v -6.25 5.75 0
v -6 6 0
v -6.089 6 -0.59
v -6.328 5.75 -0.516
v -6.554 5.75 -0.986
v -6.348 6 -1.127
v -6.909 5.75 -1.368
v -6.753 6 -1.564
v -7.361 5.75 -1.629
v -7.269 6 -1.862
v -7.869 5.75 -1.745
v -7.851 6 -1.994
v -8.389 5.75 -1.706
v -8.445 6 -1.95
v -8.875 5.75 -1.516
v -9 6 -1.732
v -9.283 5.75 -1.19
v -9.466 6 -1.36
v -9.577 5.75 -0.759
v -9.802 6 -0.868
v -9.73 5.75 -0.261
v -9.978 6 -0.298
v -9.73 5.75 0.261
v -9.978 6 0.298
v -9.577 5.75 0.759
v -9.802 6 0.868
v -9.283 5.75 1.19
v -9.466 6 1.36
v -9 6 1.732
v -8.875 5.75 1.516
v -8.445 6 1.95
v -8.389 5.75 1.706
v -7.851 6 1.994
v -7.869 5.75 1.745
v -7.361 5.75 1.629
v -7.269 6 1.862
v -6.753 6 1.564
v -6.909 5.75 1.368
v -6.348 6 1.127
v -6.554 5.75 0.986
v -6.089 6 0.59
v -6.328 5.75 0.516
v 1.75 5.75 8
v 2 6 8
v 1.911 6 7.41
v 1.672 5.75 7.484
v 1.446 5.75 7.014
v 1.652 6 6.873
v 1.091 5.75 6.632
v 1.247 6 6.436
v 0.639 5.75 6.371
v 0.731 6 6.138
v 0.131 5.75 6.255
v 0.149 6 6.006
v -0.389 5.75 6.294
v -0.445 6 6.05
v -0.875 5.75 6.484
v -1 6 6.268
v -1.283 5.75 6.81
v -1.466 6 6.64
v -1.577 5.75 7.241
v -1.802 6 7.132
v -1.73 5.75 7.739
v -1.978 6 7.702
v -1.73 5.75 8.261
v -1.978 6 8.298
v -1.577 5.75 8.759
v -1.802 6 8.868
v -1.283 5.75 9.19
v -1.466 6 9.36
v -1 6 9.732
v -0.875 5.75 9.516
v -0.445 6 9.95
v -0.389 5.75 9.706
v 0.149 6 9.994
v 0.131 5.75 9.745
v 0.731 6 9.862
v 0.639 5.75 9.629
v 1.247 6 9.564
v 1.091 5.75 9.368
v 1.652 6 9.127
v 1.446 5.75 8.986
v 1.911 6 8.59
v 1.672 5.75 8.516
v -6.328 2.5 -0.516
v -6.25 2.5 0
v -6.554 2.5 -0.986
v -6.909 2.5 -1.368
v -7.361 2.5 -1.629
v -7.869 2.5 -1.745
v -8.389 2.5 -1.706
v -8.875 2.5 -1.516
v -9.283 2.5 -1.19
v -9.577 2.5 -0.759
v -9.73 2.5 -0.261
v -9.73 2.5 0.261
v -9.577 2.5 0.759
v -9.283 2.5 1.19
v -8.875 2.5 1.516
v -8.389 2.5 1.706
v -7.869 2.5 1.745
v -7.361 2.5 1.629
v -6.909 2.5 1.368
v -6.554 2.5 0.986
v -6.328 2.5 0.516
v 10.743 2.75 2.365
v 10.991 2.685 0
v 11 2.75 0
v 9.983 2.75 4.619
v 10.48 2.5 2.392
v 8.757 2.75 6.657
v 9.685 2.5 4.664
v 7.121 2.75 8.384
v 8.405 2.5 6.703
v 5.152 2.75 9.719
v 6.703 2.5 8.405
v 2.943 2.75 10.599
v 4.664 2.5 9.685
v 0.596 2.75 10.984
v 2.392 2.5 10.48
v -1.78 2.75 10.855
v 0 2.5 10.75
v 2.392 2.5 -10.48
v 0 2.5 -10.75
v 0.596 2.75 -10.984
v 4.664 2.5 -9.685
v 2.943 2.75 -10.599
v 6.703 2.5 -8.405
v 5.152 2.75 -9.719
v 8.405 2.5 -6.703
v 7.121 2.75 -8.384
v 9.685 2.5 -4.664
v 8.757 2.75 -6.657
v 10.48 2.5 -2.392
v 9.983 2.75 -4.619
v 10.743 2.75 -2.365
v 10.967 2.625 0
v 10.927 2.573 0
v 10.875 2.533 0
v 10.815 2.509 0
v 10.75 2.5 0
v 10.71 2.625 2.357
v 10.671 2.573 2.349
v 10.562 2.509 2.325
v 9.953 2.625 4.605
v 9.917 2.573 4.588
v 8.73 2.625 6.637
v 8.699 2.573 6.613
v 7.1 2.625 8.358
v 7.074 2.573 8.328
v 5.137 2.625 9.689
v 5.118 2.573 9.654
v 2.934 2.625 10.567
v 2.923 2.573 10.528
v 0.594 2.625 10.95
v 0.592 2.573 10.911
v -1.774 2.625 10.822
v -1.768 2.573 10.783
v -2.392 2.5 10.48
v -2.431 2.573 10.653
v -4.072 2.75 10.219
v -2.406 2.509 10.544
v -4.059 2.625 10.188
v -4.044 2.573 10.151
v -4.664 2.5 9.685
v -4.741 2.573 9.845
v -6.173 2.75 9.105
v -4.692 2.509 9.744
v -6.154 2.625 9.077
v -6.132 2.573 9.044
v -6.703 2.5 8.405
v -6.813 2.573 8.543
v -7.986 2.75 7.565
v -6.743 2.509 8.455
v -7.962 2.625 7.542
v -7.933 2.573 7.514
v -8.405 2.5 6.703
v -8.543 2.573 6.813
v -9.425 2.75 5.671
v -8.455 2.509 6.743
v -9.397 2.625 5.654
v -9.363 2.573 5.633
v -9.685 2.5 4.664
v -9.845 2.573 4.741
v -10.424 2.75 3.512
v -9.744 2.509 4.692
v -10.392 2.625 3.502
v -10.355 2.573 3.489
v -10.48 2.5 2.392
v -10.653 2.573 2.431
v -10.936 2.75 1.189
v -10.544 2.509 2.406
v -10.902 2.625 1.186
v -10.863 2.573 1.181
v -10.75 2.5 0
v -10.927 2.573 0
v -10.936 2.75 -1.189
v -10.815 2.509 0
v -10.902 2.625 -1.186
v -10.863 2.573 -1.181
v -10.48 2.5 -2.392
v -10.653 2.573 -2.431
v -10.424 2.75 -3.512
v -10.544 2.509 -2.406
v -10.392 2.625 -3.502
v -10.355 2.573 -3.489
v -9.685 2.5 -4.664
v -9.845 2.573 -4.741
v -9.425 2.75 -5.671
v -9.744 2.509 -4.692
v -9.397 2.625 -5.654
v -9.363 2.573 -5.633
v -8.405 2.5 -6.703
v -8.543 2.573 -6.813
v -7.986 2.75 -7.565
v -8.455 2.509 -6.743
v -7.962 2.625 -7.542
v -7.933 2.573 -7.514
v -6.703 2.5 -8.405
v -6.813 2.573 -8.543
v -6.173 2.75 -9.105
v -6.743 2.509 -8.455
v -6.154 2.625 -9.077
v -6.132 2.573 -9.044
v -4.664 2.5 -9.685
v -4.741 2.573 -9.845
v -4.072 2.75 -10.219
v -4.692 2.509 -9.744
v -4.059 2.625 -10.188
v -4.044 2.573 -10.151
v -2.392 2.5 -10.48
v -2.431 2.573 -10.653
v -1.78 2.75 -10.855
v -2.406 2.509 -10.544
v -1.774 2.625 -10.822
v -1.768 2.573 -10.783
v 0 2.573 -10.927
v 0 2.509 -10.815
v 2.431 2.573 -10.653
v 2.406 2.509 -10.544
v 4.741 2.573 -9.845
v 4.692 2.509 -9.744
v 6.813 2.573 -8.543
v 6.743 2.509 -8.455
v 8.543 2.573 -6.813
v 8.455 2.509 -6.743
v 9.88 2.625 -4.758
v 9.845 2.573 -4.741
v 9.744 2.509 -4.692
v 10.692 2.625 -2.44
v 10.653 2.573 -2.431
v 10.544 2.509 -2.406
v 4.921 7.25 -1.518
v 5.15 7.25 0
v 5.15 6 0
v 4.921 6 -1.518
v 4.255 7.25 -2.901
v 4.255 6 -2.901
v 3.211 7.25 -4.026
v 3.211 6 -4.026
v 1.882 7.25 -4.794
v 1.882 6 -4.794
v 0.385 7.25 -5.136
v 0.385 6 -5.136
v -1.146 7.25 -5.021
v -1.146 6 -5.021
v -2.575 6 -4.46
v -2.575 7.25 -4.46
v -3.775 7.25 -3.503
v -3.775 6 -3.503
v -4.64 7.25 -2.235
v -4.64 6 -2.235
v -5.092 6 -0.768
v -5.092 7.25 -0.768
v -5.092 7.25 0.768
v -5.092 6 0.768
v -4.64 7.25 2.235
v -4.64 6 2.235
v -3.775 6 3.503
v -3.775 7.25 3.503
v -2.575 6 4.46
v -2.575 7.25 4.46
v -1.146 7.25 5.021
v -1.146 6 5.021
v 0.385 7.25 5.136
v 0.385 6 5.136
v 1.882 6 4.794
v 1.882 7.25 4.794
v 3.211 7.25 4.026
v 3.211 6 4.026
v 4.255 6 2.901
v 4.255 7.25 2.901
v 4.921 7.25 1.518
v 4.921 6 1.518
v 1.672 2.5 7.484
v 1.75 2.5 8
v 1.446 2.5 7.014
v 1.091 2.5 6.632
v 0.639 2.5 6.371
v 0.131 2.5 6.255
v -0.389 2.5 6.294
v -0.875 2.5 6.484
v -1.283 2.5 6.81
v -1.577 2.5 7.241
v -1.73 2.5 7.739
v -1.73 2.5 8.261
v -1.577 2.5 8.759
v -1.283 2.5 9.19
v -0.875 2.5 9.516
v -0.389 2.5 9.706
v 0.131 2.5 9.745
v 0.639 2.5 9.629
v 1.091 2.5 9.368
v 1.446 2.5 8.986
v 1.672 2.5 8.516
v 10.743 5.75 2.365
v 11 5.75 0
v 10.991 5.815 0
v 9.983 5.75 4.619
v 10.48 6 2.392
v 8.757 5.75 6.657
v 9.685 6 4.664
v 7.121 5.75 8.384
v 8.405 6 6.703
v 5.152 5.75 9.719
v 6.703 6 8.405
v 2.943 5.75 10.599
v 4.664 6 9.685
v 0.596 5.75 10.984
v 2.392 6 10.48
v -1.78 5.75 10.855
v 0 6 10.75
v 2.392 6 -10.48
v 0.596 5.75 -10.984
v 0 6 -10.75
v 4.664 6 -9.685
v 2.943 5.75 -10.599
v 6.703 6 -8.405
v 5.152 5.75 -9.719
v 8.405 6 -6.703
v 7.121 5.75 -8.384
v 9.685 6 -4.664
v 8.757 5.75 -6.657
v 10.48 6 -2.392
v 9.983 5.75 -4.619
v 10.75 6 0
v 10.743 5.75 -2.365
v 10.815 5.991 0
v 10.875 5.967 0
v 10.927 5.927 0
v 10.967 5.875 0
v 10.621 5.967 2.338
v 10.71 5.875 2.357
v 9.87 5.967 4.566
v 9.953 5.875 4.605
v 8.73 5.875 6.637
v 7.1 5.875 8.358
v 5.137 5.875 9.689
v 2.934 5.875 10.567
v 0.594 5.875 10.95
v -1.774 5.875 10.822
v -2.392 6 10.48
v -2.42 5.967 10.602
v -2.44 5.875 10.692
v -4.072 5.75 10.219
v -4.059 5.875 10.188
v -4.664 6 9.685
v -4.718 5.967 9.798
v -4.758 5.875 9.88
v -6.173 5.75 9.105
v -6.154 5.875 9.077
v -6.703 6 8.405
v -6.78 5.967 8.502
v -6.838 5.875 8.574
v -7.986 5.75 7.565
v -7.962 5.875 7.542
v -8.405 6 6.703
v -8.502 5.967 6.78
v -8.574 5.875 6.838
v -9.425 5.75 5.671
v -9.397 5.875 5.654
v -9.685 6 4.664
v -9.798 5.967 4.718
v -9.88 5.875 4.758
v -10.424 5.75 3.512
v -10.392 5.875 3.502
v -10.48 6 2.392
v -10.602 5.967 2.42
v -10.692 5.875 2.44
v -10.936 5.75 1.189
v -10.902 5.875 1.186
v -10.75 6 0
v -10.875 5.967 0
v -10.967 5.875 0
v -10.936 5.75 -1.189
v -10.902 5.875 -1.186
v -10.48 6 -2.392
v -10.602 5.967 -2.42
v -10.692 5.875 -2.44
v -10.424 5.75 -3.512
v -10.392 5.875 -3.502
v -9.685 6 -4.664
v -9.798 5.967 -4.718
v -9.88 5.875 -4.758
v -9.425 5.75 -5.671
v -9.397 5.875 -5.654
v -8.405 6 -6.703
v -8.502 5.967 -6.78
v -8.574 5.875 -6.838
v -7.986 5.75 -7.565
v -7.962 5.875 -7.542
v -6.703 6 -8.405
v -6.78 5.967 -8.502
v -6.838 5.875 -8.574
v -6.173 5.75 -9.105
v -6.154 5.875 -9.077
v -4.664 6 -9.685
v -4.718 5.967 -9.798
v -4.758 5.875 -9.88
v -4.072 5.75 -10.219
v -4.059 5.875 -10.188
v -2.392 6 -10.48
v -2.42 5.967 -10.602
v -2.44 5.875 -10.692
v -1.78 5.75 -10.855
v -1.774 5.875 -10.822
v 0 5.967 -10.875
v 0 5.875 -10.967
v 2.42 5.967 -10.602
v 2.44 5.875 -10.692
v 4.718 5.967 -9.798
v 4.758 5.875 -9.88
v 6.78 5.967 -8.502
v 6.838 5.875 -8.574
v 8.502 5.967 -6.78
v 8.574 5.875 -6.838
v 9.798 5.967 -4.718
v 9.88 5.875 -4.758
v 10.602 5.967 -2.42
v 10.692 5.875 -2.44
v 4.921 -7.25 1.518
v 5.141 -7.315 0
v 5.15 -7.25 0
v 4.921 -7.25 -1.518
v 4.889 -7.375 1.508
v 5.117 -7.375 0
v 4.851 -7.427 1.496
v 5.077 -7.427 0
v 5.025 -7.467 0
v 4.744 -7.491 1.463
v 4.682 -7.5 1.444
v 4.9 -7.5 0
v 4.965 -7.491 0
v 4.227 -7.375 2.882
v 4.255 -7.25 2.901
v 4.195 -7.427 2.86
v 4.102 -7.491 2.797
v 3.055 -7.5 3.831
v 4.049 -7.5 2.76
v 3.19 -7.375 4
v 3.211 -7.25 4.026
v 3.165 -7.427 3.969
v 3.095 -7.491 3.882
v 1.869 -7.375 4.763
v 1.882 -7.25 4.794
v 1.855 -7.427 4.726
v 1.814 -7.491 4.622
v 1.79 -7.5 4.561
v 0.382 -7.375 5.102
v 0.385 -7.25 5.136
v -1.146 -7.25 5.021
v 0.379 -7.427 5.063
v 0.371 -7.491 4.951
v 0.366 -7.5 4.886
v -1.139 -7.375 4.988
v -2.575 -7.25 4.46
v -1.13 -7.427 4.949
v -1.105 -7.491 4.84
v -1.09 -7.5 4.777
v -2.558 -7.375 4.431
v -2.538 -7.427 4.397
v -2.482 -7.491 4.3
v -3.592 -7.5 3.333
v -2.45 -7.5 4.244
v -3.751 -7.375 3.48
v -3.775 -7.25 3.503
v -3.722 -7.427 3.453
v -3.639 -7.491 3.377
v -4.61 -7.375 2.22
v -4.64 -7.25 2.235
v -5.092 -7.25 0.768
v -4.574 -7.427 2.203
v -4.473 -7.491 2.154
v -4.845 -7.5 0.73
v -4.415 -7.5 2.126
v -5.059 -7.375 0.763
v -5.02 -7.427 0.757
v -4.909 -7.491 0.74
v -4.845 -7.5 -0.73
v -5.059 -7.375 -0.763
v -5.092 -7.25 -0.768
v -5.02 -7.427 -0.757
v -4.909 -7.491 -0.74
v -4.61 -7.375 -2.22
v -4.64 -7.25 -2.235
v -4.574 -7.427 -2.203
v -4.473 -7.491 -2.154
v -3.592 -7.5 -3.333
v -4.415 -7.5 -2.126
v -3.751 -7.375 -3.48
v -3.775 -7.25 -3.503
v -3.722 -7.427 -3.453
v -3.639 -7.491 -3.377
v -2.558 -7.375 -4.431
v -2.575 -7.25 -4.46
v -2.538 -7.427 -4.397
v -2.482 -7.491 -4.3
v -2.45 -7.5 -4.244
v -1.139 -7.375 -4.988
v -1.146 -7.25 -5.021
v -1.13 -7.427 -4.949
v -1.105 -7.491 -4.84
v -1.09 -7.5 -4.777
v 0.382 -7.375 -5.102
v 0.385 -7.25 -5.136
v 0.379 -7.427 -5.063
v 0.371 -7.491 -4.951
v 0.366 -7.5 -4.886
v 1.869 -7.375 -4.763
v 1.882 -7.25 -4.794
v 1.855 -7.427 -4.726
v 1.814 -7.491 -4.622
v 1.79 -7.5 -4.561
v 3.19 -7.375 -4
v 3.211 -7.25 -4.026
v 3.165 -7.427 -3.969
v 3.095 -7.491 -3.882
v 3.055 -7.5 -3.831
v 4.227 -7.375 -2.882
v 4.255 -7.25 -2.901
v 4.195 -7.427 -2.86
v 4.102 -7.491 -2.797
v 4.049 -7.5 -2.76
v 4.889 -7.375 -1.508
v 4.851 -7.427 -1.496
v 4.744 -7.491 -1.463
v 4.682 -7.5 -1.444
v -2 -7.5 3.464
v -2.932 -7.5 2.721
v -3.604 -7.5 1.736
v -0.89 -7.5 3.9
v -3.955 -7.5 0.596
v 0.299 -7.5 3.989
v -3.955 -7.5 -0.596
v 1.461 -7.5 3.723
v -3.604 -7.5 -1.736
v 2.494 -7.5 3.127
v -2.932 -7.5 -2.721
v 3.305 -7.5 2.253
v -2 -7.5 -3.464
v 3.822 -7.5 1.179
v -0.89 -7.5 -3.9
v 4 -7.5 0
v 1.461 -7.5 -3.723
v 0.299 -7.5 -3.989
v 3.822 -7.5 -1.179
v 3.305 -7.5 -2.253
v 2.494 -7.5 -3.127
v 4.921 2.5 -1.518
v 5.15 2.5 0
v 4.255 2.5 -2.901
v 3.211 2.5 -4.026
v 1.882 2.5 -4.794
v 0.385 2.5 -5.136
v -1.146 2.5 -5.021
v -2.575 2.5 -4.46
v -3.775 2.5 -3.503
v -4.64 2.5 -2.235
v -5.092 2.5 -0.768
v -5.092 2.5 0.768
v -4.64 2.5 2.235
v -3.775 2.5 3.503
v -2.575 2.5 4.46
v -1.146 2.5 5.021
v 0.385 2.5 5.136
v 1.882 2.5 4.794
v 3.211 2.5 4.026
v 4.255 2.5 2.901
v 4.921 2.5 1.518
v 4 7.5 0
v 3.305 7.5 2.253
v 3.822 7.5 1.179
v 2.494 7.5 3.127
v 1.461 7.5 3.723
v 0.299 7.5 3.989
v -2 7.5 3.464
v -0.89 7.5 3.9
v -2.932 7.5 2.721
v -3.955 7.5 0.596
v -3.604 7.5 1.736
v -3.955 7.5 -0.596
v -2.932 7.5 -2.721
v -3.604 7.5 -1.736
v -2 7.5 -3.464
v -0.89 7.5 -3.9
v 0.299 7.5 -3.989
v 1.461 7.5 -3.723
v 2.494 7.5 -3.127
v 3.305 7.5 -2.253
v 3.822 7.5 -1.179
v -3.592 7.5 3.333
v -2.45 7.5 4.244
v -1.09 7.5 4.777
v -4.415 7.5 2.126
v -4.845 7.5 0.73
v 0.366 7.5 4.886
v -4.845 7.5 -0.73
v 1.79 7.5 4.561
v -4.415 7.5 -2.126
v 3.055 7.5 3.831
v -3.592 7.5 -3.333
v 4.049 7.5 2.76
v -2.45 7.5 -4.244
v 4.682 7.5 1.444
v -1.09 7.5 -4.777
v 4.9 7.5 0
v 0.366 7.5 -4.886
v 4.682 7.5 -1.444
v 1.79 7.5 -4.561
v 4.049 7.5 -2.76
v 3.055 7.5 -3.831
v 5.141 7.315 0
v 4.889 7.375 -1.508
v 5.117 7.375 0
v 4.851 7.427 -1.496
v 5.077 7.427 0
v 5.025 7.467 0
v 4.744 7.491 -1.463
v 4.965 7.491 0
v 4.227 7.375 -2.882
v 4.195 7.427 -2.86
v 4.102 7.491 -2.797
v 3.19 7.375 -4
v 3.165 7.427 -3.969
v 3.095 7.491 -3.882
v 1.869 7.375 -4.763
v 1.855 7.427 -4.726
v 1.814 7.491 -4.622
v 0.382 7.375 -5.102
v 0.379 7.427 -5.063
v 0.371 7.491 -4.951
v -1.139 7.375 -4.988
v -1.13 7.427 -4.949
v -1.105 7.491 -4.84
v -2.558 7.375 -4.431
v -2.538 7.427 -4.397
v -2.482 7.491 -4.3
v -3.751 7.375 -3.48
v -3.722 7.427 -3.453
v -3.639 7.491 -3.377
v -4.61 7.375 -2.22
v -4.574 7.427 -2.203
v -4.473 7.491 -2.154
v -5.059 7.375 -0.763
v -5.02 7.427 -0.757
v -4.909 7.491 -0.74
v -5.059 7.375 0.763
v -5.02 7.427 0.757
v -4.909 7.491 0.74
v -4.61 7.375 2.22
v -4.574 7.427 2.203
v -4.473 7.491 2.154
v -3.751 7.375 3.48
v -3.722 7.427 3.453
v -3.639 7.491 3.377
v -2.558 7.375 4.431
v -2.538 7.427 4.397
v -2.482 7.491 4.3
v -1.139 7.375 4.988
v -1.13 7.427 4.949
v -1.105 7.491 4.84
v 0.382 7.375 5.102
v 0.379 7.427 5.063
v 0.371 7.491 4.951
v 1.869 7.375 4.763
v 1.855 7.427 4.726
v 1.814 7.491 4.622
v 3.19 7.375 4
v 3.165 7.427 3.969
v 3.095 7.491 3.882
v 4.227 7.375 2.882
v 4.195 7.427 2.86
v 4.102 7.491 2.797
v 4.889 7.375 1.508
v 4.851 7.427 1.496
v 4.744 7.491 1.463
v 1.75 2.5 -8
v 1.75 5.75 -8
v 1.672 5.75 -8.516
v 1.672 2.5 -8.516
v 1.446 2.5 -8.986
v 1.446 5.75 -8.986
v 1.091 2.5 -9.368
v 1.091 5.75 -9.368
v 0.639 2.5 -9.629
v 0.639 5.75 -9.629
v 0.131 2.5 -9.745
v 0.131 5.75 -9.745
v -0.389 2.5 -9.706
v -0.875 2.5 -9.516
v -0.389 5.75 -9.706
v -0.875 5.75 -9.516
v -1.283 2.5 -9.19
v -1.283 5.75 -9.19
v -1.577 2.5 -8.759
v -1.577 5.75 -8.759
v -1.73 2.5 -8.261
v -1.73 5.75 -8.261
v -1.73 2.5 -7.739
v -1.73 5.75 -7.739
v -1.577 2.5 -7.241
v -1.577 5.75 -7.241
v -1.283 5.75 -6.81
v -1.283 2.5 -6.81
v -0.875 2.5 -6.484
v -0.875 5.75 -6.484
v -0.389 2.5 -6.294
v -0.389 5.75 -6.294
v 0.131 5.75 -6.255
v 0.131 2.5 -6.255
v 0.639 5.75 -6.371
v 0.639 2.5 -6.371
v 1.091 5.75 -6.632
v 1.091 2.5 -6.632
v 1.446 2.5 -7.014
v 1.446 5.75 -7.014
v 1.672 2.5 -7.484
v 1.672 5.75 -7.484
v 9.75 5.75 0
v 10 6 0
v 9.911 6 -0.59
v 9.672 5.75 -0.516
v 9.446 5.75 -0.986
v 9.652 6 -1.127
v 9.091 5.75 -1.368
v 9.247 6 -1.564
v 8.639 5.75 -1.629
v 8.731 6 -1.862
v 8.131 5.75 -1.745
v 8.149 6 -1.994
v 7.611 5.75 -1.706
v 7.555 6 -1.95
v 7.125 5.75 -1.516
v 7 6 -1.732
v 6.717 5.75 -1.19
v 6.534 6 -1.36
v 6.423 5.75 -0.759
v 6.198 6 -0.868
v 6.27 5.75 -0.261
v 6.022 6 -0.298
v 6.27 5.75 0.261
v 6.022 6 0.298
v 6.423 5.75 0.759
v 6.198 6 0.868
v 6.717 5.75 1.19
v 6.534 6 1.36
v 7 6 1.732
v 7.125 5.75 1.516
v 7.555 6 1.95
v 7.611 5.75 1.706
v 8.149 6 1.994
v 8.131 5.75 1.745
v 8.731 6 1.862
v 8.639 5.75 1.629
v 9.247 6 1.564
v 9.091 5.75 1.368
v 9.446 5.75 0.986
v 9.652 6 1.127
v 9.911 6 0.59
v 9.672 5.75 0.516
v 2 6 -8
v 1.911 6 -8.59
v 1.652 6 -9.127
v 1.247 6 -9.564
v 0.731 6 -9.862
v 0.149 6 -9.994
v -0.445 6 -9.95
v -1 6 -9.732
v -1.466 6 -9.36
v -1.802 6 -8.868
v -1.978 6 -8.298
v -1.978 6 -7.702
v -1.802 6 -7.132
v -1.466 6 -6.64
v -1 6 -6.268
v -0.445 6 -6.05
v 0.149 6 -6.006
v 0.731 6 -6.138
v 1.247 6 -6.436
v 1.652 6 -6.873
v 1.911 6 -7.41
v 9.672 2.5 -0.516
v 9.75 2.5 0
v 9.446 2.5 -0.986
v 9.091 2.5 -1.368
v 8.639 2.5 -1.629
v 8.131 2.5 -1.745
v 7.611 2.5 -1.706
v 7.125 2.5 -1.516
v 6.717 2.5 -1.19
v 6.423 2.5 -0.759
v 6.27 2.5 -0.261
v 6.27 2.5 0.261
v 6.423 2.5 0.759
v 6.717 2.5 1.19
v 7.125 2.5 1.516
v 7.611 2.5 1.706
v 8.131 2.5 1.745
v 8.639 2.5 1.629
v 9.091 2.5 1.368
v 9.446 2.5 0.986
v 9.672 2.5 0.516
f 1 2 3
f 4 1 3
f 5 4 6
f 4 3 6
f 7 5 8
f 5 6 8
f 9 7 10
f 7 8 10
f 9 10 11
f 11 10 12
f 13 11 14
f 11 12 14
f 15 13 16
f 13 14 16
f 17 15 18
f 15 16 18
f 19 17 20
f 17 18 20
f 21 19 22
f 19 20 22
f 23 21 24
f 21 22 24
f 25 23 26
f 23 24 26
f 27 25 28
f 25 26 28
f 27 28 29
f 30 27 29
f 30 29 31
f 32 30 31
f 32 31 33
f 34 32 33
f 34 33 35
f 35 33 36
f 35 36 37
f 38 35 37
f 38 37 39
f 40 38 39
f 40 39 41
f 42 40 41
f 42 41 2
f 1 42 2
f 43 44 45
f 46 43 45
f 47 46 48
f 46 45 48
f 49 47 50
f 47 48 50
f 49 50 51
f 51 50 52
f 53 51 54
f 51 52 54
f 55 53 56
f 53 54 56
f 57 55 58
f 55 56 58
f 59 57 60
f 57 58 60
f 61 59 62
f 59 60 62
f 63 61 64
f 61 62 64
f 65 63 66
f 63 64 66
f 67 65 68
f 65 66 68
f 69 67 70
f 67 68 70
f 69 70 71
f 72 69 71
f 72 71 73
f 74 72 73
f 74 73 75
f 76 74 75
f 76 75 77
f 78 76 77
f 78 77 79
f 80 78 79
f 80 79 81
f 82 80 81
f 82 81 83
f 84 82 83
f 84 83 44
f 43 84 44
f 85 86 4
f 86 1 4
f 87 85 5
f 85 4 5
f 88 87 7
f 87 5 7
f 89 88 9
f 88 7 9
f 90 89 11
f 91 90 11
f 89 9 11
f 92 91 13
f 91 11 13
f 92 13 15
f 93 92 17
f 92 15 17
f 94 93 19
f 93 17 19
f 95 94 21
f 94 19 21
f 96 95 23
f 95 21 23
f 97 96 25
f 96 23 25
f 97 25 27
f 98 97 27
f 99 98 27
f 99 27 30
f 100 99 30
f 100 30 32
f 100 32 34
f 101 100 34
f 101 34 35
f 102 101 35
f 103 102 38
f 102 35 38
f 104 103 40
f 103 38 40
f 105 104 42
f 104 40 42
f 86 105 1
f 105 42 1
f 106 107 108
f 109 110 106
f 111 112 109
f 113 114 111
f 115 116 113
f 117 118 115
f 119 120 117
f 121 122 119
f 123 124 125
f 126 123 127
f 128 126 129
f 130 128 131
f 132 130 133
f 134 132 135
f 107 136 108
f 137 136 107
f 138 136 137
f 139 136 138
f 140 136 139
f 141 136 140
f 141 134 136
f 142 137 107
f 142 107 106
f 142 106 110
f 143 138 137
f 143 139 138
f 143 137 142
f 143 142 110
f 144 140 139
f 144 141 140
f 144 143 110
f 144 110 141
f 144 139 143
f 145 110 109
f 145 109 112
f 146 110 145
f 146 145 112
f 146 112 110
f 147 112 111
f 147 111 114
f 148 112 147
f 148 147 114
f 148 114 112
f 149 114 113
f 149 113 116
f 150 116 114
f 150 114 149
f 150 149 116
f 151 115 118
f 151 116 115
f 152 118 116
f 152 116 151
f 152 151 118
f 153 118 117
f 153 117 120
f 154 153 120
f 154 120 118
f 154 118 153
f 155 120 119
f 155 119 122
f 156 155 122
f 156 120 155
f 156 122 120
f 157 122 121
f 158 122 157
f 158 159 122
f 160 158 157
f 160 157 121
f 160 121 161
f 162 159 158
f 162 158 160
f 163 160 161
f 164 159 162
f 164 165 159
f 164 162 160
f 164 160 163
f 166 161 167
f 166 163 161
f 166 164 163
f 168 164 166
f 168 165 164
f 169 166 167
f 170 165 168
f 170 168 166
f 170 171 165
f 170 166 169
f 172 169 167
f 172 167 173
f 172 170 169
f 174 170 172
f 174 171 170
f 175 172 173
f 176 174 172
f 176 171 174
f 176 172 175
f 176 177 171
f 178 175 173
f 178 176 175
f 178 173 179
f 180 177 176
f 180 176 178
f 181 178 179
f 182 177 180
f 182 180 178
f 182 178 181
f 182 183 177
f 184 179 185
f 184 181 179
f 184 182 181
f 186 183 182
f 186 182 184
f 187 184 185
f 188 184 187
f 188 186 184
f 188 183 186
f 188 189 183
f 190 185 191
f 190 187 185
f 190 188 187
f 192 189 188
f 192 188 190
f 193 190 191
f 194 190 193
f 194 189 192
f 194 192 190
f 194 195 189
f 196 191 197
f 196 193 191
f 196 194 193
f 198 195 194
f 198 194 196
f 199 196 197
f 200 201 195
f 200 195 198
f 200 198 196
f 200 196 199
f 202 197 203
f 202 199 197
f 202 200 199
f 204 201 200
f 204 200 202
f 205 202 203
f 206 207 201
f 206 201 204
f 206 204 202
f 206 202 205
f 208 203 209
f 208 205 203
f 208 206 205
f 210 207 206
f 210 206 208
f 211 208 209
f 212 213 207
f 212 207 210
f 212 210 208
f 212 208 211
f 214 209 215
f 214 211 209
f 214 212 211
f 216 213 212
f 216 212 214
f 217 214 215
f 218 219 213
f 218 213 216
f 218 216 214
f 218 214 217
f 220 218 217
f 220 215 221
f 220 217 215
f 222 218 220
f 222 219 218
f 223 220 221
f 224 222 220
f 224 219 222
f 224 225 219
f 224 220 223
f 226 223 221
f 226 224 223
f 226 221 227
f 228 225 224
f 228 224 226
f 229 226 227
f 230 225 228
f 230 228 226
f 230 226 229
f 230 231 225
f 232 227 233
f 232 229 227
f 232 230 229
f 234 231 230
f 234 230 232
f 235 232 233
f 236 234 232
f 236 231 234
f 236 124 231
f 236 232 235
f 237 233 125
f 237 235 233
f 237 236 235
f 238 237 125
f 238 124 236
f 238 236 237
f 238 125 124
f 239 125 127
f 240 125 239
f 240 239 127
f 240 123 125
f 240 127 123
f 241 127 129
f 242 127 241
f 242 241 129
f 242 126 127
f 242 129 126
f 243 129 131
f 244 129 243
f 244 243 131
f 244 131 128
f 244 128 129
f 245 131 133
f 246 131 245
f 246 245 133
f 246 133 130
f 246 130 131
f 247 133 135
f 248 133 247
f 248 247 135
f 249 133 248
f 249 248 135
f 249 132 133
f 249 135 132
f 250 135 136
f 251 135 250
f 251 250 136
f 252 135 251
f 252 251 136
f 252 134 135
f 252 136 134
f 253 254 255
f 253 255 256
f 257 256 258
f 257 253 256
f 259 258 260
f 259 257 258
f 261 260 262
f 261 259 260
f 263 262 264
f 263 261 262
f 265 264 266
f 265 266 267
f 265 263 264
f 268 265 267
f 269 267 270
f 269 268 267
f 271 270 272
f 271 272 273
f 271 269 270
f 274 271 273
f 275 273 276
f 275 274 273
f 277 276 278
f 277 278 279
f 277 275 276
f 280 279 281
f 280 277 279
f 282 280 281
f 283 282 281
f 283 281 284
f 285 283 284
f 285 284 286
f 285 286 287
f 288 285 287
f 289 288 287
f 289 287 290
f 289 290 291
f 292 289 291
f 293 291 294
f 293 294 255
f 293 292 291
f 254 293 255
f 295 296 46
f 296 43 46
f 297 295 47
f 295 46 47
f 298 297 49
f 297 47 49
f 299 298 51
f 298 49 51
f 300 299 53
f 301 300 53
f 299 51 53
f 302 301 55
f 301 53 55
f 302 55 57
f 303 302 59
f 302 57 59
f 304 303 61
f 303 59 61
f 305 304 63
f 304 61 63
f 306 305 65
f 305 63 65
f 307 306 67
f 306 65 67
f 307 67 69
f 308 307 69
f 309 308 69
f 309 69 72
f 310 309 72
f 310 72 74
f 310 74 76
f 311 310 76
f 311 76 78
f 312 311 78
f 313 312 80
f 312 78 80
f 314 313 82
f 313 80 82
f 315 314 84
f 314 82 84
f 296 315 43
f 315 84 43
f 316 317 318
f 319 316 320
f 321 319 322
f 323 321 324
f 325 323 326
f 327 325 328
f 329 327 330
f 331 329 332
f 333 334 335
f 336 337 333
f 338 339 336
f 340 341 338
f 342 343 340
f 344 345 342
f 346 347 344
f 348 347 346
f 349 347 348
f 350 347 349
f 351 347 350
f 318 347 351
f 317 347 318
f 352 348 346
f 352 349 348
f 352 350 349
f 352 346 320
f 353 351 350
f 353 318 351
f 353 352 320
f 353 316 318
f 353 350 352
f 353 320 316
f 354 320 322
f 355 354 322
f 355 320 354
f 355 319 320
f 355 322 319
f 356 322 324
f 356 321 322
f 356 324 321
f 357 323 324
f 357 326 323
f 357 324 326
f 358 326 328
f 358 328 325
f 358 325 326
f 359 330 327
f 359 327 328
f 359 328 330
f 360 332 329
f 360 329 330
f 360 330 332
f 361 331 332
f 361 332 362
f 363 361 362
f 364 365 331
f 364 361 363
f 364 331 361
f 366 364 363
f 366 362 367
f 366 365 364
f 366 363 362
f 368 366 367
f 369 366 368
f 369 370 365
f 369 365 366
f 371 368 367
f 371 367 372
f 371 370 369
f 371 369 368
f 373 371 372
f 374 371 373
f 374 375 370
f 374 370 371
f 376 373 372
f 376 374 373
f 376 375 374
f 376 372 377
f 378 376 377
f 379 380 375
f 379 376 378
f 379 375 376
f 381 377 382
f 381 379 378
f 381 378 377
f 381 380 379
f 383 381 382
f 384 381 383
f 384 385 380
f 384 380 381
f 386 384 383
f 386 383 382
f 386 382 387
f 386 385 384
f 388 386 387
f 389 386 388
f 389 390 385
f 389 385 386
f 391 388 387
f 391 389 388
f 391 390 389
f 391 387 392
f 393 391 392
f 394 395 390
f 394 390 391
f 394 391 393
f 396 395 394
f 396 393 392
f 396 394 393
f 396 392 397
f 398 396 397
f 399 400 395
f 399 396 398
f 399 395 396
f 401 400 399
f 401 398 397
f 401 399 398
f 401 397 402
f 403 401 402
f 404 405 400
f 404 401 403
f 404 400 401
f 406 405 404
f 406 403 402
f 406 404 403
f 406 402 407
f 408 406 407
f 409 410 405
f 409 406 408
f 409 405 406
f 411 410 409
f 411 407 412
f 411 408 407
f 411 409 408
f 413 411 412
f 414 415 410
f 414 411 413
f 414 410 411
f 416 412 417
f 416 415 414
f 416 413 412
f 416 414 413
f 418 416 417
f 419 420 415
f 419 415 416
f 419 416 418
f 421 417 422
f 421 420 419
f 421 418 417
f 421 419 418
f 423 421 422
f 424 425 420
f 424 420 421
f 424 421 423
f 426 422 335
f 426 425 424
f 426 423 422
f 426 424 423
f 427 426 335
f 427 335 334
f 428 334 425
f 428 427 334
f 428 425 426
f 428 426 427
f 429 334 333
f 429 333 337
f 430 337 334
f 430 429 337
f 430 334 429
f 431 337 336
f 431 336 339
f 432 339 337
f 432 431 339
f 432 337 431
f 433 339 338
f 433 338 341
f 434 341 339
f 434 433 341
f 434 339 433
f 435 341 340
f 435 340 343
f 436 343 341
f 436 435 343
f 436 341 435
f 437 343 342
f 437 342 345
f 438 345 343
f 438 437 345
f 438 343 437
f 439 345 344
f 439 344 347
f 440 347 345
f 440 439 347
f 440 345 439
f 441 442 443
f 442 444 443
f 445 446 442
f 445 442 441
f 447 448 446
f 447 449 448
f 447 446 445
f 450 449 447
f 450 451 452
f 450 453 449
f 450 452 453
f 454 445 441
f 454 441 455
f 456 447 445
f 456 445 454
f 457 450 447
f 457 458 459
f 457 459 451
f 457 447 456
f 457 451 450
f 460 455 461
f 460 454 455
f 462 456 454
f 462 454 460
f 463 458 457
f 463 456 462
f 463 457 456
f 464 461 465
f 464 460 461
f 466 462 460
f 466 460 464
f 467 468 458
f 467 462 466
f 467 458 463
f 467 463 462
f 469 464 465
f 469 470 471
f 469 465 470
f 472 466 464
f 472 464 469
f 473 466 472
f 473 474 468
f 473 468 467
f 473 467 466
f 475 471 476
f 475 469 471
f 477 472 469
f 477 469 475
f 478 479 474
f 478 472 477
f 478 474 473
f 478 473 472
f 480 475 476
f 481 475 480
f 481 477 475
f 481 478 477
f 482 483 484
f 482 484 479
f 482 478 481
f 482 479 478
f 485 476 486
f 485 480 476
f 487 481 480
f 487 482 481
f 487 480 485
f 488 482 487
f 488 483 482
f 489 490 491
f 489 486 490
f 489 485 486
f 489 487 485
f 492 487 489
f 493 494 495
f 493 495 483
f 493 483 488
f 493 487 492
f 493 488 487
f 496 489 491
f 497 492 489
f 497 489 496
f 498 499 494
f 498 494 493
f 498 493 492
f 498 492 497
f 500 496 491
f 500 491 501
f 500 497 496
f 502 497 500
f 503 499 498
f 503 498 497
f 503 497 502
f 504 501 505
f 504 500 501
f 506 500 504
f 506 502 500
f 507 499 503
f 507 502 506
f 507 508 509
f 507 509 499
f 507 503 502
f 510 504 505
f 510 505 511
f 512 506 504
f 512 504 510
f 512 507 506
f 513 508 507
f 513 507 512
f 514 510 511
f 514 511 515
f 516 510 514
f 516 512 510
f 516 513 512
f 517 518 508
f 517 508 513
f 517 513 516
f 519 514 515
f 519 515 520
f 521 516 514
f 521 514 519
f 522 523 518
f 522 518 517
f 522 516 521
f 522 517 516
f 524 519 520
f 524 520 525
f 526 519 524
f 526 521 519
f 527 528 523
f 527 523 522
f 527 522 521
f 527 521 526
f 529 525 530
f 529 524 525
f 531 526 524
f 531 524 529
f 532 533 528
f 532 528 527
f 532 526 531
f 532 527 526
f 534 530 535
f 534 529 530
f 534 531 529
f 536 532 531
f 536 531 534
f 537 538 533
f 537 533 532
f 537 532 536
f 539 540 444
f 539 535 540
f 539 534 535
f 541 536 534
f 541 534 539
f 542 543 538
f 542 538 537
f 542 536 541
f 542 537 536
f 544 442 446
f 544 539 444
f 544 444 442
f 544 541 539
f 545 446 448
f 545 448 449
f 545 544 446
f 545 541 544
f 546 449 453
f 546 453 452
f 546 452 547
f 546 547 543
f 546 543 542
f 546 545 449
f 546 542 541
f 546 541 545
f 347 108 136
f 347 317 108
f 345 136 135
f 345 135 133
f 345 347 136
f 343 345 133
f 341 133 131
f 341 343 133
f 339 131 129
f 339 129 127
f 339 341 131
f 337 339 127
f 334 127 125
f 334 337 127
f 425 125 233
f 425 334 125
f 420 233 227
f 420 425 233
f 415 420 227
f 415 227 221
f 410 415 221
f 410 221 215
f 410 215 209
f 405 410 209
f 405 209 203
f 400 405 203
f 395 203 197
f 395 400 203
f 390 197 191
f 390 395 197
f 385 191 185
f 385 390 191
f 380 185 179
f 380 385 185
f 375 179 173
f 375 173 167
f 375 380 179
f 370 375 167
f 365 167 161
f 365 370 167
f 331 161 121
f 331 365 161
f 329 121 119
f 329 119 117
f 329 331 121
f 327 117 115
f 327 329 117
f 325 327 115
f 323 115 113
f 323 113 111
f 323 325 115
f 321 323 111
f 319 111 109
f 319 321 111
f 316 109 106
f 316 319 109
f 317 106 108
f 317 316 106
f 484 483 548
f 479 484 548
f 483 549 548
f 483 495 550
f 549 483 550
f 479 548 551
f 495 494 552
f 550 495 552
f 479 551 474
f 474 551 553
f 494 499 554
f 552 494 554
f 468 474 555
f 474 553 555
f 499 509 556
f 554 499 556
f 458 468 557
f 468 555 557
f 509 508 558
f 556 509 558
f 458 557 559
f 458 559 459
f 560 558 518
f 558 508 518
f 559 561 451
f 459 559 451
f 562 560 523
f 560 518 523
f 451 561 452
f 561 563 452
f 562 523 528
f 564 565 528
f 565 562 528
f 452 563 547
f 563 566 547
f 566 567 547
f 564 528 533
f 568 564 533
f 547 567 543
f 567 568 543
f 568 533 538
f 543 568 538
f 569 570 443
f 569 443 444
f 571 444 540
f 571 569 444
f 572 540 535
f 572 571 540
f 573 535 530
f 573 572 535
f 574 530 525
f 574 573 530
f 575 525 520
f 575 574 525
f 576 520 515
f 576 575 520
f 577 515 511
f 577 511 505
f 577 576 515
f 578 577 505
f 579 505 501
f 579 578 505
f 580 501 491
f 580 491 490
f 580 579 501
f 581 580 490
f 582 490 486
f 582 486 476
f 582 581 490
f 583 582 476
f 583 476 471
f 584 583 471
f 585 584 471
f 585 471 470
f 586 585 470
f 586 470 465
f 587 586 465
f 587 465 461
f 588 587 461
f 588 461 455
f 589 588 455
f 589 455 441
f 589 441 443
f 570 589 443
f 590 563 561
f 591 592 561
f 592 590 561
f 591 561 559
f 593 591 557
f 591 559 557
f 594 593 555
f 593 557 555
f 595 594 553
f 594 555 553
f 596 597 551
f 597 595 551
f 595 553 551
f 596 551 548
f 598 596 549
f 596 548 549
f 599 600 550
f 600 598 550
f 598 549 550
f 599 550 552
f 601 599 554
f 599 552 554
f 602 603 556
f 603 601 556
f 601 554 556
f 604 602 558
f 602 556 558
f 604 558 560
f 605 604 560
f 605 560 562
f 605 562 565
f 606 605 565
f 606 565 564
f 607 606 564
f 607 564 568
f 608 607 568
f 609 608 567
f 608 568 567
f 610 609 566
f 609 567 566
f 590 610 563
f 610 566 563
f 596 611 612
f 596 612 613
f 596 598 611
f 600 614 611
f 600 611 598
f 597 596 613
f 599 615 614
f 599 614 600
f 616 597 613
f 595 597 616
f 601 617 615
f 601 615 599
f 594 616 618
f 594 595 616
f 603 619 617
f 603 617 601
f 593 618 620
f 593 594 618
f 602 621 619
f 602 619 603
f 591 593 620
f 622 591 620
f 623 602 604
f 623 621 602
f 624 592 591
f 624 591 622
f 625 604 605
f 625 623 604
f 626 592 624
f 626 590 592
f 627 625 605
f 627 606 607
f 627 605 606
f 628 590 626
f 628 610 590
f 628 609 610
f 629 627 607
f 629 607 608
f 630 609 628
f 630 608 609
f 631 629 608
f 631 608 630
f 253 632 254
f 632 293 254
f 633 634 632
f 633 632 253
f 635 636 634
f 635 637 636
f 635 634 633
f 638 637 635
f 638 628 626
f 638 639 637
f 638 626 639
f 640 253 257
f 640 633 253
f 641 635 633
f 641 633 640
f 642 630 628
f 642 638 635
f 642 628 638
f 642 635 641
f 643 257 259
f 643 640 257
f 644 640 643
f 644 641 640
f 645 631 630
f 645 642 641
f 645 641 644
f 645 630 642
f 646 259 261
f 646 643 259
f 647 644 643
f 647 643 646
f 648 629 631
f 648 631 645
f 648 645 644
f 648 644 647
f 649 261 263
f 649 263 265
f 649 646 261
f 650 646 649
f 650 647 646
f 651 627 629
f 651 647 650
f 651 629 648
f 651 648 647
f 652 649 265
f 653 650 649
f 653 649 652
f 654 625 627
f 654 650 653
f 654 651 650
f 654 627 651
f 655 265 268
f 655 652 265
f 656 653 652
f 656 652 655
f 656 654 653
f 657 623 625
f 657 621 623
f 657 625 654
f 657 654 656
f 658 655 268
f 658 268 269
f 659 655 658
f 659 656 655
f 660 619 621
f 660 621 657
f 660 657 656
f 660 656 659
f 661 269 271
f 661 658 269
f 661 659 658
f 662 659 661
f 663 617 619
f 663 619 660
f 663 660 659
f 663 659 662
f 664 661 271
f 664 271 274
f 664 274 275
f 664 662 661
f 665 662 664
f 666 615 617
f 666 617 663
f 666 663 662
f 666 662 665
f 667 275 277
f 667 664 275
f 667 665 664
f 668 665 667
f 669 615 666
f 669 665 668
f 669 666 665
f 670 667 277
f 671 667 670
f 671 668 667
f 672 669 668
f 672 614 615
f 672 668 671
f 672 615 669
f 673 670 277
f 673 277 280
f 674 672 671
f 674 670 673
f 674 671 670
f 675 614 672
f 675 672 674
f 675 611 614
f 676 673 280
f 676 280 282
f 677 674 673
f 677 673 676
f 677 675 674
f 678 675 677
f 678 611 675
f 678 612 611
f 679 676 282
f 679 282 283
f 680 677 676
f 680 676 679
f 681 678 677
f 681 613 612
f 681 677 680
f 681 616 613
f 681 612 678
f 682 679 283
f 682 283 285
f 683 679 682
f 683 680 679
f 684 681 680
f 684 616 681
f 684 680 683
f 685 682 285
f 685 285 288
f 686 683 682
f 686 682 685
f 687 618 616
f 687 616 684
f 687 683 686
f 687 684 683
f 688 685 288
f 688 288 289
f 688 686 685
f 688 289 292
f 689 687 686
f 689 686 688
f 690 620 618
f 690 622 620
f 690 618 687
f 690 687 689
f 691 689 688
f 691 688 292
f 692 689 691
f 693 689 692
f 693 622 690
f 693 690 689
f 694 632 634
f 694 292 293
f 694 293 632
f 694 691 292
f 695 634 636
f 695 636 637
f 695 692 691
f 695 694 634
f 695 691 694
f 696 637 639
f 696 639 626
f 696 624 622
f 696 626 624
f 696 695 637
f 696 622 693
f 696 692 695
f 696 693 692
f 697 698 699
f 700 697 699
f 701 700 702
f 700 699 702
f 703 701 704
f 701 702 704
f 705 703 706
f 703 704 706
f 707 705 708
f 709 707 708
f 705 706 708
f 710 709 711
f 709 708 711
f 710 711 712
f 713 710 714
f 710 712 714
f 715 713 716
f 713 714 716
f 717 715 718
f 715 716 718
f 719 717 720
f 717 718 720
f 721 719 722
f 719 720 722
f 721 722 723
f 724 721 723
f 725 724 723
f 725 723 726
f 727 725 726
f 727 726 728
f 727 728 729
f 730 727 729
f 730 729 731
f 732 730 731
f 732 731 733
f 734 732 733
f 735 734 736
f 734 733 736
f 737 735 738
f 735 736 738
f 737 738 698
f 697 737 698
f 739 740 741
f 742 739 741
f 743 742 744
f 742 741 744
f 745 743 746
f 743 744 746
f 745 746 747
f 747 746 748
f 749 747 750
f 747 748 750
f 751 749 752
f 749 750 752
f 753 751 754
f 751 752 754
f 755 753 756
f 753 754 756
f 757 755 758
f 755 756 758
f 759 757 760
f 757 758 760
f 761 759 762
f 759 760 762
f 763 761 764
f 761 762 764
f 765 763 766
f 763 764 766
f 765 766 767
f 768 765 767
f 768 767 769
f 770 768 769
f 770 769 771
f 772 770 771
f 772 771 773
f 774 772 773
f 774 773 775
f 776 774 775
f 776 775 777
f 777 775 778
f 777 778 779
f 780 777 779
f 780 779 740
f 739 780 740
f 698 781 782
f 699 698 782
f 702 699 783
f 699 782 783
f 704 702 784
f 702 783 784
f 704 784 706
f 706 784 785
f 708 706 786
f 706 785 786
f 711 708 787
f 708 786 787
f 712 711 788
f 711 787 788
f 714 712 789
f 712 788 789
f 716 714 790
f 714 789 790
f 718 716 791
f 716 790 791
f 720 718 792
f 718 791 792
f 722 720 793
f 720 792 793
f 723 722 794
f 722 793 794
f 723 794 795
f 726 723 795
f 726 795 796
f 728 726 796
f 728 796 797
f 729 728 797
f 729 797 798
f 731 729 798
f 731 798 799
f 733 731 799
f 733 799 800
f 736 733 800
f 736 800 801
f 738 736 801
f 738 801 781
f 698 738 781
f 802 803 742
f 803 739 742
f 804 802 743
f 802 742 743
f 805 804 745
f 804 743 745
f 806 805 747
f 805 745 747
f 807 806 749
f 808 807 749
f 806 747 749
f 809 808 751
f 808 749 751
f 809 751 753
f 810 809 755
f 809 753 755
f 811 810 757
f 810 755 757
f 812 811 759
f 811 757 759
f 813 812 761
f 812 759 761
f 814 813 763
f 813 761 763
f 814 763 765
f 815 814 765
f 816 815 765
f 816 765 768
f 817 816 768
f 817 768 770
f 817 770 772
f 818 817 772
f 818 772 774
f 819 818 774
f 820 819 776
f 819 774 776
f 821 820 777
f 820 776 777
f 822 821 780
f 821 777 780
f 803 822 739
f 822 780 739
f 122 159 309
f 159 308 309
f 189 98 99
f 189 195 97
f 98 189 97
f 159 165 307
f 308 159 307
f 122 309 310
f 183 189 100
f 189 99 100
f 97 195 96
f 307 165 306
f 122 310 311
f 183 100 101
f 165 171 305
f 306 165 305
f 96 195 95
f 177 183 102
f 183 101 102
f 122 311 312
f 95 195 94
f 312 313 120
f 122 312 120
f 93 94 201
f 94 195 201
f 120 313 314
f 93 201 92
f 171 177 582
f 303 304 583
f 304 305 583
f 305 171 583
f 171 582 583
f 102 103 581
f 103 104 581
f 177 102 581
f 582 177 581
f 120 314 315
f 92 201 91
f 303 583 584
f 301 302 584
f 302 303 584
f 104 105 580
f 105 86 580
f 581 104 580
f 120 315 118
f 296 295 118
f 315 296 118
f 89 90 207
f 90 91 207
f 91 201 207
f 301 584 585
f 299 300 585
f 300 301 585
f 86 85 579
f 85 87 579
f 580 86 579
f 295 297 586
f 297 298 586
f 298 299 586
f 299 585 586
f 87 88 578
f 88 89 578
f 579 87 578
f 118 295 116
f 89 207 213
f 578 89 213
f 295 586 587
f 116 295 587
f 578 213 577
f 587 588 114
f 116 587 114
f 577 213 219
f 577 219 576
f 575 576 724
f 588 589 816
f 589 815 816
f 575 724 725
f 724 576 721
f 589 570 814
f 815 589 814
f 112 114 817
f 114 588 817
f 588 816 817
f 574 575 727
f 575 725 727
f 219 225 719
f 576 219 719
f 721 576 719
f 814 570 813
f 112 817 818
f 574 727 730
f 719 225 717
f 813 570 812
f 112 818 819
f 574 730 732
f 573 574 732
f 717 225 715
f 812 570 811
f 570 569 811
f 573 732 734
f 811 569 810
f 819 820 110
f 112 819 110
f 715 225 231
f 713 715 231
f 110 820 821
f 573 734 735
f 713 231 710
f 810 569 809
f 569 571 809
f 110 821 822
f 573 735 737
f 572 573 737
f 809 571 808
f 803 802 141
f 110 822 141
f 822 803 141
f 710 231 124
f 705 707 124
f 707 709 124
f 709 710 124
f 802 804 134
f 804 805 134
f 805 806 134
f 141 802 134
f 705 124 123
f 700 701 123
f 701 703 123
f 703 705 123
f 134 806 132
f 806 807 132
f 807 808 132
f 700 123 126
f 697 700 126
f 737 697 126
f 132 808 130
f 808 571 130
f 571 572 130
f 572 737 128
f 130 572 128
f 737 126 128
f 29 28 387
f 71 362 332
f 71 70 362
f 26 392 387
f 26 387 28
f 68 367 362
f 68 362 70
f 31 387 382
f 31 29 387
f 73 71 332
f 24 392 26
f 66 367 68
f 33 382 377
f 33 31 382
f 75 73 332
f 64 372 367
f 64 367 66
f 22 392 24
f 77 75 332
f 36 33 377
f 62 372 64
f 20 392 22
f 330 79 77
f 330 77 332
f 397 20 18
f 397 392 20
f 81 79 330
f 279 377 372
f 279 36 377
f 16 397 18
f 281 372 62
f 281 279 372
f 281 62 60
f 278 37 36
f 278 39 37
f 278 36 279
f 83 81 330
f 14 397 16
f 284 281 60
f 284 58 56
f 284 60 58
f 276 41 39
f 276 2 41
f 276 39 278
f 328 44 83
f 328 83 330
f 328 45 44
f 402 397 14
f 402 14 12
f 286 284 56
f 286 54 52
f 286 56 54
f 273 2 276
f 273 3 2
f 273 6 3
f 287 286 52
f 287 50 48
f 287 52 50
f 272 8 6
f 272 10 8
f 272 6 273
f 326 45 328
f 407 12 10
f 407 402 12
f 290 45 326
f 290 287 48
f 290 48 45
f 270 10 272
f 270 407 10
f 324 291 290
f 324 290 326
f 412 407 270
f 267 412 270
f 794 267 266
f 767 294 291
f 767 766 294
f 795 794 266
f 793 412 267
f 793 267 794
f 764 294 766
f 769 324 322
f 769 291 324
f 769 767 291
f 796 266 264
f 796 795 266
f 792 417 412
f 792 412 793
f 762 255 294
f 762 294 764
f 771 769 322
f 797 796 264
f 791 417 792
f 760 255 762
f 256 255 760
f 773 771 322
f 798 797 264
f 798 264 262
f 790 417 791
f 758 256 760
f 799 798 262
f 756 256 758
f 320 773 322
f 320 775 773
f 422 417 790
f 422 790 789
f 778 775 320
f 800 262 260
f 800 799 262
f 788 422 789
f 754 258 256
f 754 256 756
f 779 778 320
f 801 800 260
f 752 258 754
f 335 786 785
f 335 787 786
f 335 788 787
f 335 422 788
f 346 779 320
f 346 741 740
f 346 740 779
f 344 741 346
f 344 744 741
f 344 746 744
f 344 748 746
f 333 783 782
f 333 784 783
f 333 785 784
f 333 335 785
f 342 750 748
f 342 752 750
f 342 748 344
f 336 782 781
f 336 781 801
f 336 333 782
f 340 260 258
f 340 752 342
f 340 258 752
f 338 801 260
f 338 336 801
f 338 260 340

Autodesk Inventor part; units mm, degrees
ref_plane "YZ Plane" through (0, 0, 0) normal (1, 0, 0) x (0, 1, 0)
ref_plane "XZ Plane" through (0, 0, 0) normal (0, 1, 0) x (-1, 0, 0)
ref_plane "XY Plane" through (0, 0, 0) normal (0, 0, 1) x (1, 0, 0)
sketch "Sketch1" plane through (0, 0, 0) normal (0, 0, 1) x (1, 0, 0)
  line L0 (4, 7.5) -> (4, -7.5)
  line L1 (4, -7.5) -> (5.15, -7.5)
  line L2 (5.15, -7.5) -> (5.15, 2.5)
  line L3 (5.15, 2.5) -> (11, 2.5)
  line L4 (11, 2.5) -> (11, 6)
  line L5 (11, 6) -> (5.15, 6)
  line L6 (5.15, 6) -> (5.15, 7.5)
  line L7 (5.15, 7.5) -> (4, 7.5)
  line L8 (0, 0) -> (22.0974, 0) construction
  line L9 (0, -10.5) -> (0, 10.5) projected
  dimension "d1" = 3.5
  dimension "d2" = 1.5
  dimension "d3" = 15
  dimension "d4" = 11
  dimension "d5" = 4
  dimension "d6" = 5.15
revolve "Revolution1" add sketch "Sketch1" angle 360 about axis through (0, -10, 0) along (0, 1, 0)
sketch "Sketch2" plane through (0, 6, 0) normal (0, 1, 0) x (1, 0, 0)
  circle A0 centre (0, 0) radius 8 construction
  line L0 (8, 0) -> (-8, 0) construction
  line L1 (0, -8) -> (0, 8) construction
  circle A1 centre (-8, 0) radius 1.75
  circle A2 centre (0, 8) radius 1.75
  circle A3 centre (8, 0) radius 1.75
  circle A4 centre (0, -8) radius 1.75
  dimension "d8" = 16
  dimension "d9" = 3.5
extrude "Extrusion1" cut sketch "Sketch2" against normal through all
chamfer "Chamfer1" distance 0.25 angle 45 4 edges at (-1.75, 6, 8) (6.25, 6, 0) (-1.75, 6, -8) (-9.75, 6, 0)
fillet "Fillet1" radius 0.25 4 edges at (-11, 6, 0) (-11, 2.5, 0) (-5.15, 7.5, 0) (-5.15, -7.5, 0)
thread "Thread1" size "TR8x1.5" class "7H" standard "ISO Metric Trapezoidal Threads" full length
properties part number "TR8 Leadscrew Nut" material "Brass, Soft Yellow"
